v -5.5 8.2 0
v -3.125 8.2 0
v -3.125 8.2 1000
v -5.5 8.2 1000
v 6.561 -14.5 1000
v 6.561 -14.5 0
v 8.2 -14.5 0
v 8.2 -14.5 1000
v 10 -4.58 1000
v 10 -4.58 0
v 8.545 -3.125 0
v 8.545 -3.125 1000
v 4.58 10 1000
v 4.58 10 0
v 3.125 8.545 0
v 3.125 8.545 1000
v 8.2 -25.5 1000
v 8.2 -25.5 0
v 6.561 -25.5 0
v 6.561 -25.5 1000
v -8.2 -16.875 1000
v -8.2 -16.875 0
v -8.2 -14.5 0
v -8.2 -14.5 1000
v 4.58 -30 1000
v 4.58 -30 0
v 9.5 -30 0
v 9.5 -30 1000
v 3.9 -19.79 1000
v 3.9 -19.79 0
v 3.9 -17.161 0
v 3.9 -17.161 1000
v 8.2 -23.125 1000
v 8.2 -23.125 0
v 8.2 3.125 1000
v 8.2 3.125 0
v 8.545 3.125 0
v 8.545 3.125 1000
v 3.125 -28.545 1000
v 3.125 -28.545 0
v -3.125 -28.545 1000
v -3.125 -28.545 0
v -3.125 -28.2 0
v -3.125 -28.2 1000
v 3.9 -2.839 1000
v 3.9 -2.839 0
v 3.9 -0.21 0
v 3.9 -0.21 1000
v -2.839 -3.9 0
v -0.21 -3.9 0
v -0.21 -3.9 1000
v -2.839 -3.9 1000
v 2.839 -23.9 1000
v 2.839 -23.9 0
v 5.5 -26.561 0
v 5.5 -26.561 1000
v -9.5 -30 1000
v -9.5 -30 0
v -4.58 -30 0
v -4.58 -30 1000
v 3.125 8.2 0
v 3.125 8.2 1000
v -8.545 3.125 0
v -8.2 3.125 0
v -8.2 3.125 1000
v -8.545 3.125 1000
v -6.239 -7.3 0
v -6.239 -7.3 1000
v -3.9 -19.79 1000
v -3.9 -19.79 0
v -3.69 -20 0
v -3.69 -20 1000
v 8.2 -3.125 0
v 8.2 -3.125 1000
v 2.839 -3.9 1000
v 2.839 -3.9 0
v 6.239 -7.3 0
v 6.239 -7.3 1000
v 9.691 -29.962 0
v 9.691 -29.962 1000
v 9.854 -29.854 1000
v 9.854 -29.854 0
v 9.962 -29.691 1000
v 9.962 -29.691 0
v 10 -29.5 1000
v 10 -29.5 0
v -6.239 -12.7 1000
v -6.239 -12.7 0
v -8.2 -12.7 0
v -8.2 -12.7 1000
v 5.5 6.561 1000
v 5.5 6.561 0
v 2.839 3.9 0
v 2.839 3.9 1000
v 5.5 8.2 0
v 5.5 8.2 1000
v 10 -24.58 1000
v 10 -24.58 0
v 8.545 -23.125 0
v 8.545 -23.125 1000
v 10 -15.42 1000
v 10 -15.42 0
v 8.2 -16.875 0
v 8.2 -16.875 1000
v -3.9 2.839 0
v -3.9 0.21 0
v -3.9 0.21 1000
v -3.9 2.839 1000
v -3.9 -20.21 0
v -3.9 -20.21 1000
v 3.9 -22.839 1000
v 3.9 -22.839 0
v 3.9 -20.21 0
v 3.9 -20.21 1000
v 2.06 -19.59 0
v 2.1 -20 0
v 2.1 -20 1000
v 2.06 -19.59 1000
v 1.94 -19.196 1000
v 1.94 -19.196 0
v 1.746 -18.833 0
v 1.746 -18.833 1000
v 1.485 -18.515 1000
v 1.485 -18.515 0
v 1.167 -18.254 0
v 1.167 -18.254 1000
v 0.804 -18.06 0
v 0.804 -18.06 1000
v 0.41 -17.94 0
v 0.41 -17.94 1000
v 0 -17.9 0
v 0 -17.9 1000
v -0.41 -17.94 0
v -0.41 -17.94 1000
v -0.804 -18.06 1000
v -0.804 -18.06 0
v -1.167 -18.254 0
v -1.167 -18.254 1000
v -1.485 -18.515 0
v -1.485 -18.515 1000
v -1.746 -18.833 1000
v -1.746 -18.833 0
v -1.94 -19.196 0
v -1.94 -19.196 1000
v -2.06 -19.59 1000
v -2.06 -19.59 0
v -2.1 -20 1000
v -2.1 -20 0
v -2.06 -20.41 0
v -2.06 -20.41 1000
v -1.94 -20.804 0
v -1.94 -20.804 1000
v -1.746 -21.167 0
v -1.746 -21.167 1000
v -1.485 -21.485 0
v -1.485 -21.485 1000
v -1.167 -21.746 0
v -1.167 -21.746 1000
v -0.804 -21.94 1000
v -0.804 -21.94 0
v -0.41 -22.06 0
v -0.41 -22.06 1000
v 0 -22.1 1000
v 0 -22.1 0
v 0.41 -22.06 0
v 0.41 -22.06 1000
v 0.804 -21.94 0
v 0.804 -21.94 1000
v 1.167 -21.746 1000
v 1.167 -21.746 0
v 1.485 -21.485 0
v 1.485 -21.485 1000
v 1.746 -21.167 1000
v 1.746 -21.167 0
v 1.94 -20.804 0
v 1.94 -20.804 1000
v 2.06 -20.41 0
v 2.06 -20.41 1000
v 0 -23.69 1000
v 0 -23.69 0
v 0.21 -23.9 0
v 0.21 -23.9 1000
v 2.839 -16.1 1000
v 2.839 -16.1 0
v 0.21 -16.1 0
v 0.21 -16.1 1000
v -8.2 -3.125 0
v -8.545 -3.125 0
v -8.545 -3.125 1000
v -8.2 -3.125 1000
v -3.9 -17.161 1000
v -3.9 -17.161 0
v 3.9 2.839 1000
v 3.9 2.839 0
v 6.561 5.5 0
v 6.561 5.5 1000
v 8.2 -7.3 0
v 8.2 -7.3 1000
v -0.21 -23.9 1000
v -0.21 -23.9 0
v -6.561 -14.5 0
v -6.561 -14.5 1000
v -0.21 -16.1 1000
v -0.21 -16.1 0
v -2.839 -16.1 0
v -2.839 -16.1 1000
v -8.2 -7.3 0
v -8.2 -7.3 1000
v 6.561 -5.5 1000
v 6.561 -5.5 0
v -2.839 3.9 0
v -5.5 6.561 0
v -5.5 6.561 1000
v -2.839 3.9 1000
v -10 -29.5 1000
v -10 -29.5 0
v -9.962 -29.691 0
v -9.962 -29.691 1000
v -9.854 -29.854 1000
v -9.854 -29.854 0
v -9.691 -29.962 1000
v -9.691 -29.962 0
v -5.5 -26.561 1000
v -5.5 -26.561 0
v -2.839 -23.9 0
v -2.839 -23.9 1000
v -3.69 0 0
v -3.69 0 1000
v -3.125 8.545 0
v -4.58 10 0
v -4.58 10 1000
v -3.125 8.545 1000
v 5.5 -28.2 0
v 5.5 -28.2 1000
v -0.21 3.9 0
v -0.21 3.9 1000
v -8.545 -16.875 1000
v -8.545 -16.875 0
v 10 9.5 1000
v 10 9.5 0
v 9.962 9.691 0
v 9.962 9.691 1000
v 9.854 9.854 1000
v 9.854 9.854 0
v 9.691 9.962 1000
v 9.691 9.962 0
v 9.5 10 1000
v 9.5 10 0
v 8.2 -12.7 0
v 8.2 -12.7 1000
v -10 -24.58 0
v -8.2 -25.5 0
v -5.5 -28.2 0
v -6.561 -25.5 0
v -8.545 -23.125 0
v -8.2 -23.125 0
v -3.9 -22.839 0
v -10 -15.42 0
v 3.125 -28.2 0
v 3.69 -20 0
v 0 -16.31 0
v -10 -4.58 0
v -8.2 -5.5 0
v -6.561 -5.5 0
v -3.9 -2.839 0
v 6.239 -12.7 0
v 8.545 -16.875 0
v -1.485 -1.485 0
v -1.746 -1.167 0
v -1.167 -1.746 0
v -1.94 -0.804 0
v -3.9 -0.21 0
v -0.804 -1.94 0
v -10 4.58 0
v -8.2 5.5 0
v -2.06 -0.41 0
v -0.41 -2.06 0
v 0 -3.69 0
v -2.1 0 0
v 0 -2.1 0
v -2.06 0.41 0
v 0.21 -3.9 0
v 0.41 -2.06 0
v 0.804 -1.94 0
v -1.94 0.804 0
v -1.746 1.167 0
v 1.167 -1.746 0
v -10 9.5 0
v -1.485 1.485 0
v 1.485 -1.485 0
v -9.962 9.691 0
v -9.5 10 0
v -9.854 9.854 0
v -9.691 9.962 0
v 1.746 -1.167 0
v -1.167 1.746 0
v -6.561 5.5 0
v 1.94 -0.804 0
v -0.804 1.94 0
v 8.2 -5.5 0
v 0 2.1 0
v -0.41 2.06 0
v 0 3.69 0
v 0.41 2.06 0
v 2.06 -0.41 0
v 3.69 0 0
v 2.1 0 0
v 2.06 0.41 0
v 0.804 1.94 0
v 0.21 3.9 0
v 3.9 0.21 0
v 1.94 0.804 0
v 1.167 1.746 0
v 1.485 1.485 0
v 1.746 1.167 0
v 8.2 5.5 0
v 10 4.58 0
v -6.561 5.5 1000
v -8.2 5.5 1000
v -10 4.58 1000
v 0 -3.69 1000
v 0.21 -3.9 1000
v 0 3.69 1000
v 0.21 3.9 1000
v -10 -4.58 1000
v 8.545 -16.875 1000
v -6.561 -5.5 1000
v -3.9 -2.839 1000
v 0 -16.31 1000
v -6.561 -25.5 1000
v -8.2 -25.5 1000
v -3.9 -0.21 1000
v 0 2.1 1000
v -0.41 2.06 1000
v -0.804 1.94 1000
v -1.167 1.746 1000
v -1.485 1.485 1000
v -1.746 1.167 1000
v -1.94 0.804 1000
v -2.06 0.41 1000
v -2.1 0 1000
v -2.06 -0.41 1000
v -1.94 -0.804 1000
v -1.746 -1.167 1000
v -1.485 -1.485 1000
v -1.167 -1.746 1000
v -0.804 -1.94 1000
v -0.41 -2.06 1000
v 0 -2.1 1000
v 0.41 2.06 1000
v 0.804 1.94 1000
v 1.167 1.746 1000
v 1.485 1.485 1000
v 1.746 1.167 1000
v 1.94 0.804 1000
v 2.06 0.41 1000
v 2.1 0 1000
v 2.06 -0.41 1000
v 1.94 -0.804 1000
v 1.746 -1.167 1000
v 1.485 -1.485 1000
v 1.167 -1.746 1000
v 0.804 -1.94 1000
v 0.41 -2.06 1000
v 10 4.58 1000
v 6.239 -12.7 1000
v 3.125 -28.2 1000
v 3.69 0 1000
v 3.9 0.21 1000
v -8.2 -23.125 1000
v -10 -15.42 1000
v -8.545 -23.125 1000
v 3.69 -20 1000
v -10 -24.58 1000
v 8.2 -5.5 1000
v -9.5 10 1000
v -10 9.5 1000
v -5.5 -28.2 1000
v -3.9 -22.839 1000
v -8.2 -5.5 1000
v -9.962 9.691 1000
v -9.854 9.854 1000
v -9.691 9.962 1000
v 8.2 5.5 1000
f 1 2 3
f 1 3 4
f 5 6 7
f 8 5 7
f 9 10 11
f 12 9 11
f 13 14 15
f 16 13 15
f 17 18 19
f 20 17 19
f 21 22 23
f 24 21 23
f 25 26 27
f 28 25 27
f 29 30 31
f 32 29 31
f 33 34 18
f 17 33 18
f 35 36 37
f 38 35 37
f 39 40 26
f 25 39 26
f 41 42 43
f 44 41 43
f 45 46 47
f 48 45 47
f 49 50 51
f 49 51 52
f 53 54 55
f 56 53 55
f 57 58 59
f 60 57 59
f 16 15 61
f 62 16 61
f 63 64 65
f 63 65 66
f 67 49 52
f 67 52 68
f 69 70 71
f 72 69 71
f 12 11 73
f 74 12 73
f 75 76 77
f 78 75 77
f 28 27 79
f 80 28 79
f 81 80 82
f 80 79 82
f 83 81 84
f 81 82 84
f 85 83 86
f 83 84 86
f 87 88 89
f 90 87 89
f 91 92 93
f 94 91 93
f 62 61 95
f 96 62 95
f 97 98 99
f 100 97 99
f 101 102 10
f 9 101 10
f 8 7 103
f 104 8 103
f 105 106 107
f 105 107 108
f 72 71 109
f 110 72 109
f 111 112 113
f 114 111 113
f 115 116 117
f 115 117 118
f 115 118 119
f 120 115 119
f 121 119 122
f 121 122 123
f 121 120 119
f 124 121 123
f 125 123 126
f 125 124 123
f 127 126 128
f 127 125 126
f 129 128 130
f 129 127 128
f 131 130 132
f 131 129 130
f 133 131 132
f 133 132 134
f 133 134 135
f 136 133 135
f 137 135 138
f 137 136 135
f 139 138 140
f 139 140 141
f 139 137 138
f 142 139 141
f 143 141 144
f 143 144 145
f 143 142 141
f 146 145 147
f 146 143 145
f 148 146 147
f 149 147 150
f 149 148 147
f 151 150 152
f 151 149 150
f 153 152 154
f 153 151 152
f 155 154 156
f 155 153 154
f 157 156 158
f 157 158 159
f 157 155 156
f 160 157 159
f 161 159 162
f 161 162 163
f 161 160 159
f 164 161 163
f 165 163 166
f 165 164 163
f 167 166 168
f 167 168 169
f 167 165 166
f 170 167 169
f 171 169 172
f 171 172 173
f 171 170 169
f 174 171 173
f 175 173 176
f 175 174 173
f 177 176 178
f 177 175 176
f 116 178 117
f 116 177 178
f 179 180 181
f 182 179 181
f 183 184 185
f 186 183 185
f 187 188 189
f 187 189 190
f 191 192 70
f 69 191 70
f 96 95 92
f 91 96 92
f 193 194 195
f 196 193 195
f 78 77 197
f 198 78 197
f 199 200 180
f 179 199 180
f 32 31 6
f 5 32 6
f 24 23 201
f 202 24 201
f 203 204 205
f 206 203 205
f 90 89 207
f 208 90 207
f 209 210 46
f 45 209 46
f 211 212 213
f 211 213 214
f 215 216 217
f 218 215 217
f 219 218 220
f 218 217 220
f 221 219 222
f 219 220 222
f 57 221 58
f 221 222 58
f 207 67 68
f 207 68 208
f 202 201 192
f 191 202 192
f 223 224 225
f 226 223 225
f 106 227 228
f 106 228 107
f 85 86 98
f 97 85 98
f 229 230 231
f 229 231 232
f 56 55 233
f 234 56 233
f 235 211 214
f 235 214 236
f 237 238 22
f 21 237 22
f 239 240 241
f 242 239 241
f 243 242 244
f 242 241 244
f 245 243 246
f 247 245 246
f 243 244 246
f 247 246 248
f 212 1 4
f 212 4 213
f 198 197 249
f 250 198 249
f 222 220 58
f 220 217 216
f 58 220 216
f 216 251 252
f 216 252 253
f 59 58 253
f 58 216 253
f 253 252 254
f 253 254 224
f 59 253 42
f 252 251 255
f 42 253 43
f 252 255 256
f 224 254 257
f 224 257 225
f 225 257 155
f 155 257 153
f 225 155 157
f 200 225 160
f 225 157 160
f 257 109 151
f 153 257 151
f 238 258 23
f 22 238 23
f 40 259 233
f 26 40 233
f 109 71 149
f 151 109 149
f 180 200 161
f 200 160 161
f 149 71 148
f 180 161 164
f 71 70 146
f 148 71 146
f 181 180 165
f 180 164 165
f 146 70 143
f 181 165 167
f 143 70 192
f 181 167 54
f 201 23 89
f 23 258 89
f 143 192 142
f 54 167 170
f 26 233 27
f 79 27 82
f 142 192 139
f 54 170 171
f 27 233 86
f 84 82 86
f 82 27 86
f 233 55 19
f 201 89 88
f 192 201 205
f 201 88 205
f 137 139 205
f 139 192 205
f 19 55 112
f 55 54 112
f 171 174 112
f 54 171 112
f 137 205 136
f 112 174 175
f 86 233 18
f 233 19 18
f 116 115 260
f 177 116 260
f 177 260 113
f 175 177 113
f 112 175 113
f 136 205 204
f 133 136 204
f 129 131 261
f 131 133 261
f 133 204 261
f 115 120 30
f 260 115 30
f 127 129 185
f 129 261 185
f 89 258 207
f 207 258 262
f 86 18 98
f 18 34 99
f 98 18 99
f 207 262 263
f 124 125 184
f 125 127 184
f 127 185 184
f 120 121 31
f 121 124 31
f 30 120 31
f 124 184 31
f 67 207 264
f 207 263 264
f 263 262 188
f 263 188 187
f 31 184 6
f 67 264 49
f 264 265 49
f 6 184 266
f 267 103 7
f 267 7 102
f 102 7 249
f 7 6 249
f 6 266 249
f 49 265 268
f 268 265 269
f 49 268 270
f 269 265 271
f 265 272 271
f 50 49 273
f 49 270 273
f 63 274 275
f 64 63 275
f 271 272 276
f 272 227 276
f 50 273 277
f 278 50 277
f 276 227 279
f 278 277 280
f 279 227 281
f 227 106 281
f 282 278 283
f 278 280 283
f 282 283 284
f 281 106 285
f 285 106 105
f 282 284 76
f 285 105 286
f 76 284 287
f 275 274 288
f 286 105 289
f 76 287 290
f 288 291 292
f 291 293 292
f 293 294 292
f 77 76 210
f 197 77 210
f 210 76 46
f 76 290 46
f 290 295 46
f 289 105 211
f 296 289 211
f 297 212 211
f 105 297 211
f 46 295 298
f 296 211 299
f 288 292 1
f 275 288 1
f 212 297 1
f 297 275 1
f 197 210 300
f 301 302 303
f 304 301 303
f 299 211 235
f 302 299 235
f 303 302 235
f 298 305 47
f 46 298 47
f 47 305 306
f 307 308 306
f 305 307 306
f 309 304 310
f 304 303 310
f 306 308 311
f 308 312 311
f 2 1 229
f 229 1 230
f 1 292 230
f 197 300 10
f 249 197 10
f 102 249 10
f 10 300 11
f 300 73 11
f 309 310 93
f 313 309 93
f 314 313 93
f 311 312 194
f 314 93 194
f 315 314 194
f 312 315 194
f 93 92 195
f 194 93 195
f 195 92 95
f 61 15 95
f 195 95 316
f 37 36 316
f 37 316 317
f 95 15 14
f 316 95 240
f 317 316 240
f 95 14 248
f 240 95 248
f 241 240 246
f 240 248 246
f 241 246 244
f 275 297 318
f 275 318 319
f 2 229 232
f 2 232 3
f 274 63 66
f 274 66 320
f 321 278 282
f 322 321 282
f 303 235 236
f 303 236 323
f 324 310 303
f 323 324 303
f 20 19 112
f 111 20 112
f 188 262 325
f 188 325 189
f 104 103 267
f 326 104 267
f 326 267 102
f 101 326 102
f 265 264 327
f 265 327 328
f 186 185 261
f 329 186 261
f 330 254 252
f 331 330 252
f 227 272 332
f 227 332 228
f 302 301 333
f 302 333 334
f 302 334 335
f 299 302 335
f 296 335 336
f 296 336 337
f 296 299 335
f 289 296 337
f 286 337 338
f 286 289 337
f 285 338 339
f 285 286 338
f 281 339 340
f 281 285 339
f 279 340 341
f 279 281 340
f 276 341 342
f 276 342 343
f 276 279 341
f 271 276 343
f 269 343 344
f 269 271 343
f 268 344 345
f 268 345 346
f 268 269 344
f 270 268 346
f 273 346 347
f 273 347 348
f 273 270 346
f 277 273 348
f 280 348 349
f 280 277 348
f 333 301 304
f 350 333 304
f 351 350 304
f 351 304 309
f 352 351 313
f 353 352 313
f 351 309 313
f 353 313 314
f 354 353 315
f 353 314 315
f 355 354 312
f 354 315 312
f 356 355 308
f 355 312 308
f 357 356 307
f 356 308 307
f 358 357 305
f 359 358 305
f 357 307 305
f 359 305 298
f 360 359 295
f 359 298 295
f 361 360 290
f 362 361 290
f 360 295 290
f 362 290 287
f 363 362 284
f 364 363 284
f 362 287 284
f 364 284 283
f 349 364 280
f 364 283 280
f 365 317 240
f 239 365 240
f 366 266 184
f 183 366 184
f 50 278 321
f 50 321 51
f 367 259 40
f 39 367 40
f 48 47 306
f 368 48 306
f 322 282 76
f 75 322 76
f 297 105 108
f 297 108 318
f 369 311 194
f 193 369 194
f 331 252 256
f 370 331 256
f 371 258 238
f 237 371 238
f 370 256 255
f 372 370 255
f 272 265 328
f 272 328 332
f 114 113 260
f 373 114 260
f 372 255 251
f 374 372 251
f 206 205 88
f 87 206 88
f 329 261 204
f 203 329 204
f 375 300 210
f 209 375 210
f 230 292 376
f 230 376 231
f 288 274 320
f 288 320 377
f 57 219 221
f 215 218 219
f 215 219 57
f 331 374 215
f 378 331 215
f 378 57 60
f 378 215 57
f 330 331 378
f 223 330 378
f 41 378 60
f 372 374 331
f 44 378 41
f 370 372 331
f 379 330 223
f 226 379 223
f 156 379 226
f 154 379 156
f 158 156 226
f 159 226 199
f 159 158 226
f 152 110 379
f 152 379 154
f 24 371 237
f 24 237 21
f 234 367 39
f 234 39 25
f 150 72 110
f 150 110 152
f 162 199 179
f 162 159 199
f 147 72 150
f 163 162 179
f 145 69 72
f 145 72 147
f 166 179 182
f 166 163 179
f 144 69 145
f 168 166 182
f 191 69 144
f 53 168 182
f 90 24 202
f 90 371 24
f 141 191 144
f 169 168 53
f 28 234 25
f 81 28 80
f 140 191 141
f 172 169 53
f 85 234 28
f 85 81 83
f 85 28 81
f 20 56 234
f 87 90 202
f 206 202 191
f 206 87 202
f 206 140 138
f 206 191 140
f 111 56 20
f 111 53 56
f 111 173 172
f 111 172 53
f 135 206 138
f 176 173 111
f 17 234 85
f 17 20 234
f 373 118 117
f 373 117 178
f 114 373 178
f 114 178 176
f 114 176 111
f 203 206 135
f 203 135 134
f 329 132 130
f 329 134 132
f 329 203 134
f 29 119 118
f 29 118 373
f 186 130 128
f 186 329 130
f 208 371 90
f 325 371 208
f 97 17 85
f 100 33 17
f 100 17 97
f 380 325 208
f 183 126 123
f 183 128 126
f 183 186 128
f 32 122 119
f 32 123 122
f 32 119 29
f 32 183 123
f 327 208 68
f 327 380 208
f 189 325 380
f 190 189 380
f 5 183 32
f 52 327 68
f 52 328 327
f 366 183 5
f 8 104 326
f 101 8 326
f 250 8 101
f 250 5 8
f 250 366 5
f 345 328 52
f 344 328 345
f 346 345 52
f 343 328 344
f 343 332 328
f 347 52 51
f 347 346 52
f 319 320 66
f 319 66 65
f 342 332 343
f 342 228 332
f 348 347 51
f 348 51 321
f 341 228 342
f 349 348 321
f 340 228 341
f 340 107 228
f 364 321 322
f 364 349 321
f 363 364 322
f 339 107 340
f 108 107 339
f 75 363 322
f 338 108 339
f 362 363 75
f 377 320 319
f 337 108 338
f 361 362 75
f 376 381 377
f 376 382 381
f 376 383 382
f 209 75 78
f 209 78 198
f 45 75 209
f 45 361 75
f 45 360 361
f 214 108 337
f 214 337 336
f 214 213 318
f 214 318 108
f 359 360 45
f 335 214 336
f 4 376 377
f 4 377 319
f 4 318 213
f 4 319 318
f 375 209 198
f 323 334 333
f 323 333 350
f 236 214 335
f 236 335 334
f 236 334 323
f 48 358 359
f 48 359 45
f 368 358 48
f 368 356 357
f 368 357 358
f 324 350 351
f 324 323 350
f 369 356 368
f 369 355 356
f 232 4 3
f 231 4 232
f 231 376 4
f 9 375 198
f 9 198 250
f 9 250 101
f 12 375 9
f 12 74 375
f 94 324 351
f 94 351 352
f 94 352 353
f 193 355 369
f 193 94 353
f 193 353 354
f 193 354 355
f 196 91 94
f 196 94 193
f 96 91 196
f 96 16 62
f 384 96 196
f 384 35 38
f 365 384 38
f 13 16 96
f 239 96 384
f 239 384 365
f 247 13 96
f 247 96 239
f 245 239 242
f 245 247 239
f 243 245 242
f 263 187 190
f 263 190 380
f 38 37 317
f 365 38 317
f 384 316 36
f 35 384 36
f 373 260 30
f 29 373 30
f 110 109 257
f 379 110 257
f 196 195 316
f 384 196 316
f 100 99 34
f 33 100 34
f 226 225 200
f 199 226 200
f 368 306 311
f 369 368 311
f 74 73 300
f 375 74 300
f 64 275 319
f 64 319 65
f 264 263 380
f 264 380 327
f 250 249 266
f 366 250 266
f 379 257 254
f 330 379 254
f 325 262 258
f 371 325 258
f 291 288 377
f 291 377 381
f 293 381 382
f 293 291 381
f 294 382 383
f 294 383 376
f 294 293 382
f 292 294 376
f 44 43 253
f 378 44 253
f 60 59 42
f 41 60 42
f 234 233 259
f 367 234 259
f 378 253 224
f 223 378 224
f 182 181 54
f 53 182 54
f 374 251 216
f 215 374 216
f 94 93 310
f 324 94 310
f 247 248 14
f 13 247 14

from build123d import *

# Parameters (mm, degrees)
BOSS_EXTRU_1_DEPTH  = 1000
SYM_TRIE6_OUTLINE_R = 2.1
SYM_TRIE6_DEPTH     = 1000


# Read off the part's stored shape, not the designer's step: Symétrie6
with BuildPart() as part:
    # Esquisse1 → Boss.-Extru.1 (new body)
    with BuildSketch(Plane.XY):
        with BuildLine():
            Line((-9.5, 10), (-4.58, 10))
            Line((-4.58, 10), (-3.125, 8.545))
            Line((-3.125, 8.545), (-3.125, 8.2))
            Line((-3.125, 8.2), (-5.5, 8.2))
            Line((-5.5, 8.2), (-5.5, 6.560660172))
            Line((-5.5, 6.560660172), (-2.839339828, 3.9))
            Line((-2.839339828, 3.9), (-0.21, 3.9))
            Line((-0.21, 3.9), (0, 3.69))
            Line((0, 3.69), (0, 2.1))
            ThreePointArc((0, 2.1), (-2.1, 0), (0, -2.1))
            Line((0, -2.1), (0, -3.69))
            Line((0, -3.69), (-0.21, -3.9))
            Line((-0.21, -3.9), (-2.839339828, -3.9))
            Line((-2.839339828, -3.9), (-6.239339828, -7.3))
            Line((-6.239339828, -7.3), (-8.2, -7.3))
            Line((-8.2, -7.3), (-8.2, -10))
            Line((-8.2, -10), (-10, -10))
            Line((-10, -10), (-10, -4.58))
            Line((-10, -4.58), (-8.545, -3.125))
            Line((-8.545, -3.125), (-8.2, -3.125))
            Line((-8.2, -3.125), (-8.2, -5.5))
            Line((-8.2, -5.5), (-6.560660172, -5.5))
            Line((-6.560660172, -5.5), (-3.9, -2.839339828))
            Line((-3.9, -2.839339828), (-3.9, -0.21))
            Line((-3.9, -0.21), (-3.69, 0))
            Line((-3.69, 0), (-3.9, 0.21))
            Line((-3.9, 0.21), (-3.9, 2.839339828))
            Line((-3.9, 2.839339828), (-6.560660172, 5.5))
            Line((-6.560660172, 5.5), (-8.2, 5.5))
            Line((-8.2, 5.5), (-8.2, 3.125))
            Line((-8.2, 3.125), (-8.545, 3.125))
            Line((-8.545, 3.125), (-10, 4.58))
            Line((-10, 4.58), (-10, 9.5))
            ThreePointArc((-10, 9.5), (-9.853553391, 9.853553391), (-9.5, 10))
        make_face()
    boss_extru_1 = extrude(amount=BOSS_EXTRU_1_DEPTH)

    # Symétrie1: Boss.-Extru.1 across Right Plane
    add(boss_extru_1.mirror(Plane(origin=(0, 0, 0), x_dir=(0, 0, -1), z_dir=(1, 0, 0))))

    # Symétrie6 outline → Symétrie6 (add)
    with BuildSketch(Plane.XY):
        with BuildLine():
            Line((-3.9, -17.160660172), (-3.9, -19.79))
            Line((-3.9, -19.79), (-3.69, -20))
            Line((-3.69, -20), (-3.9, -20.21))
            Line((-3.9, -20.21), (-3.9, -22.839339828))
            Line((-3.9, -22.839339828), (-6.560660172, -25.5))
            Line((-6.560660172, -25.5), (-8.2, -25.5))
            Line((-8.2, -25.5), (-8.2, -23.125))
            Line((-8.2, -23.125), (-8.545, -23.125))
            Line((-8.545, -23.125), (-10, -24.58))
            Line((-10, -24.58), (-10, -29.5))
            ThreePointArc((-10, -29.5), (-9.853553391, -29.853553391), (-9.5, -30))
            Line((-9.5, -30), (-4.58, -30))
            Line((-4.58, -30), (-3.125, -28.545))
            Line((-3.125, -28.545), (-3.125, -28.2))
            Line((-3.125, -28.2), (-5.5, -28.2))
            Line((-5.5, -28.2), (-5.5, -26.560660172))
            Line((-5.5, -26.560660172), (-2.839339828, -23.9))
            Line((-2.839339828, -23.9), (-0.21, -23.9))
            Line((-0.21, -23.9), (0, -23.69))
            Line((0, -23.69), (0.21, -23.9))
            Line((0.21, -23.9), (2.839339828, -23.9))
            Line((2.839339828, -23.9), (5.5, -26.560660172))
            Line((5.5, -26.560660172), (5.5, -28.2))
            Line((5.5, -28.2), (3.125, -28.2))
            Line((3.125, -28.2), (3.125, -28.545))
            Line((3.125, -28.545), (4.58, -30))
            Line((4.58, -30), (9.5, -30))
            ThreePointArc((9.5, -30), (9.853553391, -29.853553391), (10, -29.5))
            Line((10, -29.5), (10, -24.58))
            Line((10, -24.58), (8.545, -23.125))
            Line((8.545, -23.125), (8.2, -23.125))
            Line((8.2, -23.125), (8.2, -25.5))
            Line((8.2, -25.5), (6.560660172, -25.5))
            Line((6.560660172, -25.5), (3.9, -22.839339828))
            Line((3.9, -22.839339828), (3.9, -20.21))
            Line((3.9, -20.21), (3.69, -20))
            Line((3.69, -20), (3.9, -19.79))
            Line((3.9, -19.79), (3.9, -17.160660172))
            Line((3.9, -17.160660172), (6.560660172, -14.5))
            Line((6.560660172, -14.5), (8.2, -14.5))
            Line((8.2, -14.5), (8.2, -16.875))
            Line((8.2, -16.875), (8.545, -16.875))
            Line((8.545, -16.875), (10, -15.42))
            Line((10, -15.42), (10, -10))
            Line((10, -10), (8.2, -10))
            Line((8.2, -10), (8.2, -12.7))
            Line((8.2, -12.7), (6.239339828, -12.7))
            Line((6.239339828, -12.7), (2.839339828, -16.1))
            Line((2.839339828, -16.1), (0.21, -16.1))
            Line((0.21, -16.1), (0, -16.31))
            Line((0, -16.31), (-0.21, -16.1))
            Line((-0.21, -16.1), (-2.839339828, -16.1))
            Line((-2.839339828, -16.1), (-6.239339828, -12.7))
            Line((-6.239339828, -12.7), (-8.2, -12.7))
            Line((-8.2, -12.7), (-8.2, -10))
            Line((-8.2, -10), (-10, -10))
            Line((-10, -10), (-10, -15.42))
            Line((-10, -15.42), (-8.545, -16.875))
            Line((-8.545, -16.875), (-8.2, -16.875))
            Line((-8.2, -16.875), (-8.2, -14.5))
            Line((-8.2, -14.5), (-6.560660172, -14.5))
            Line((-6.560660172, -14.5), (-3.9, -17.160660172))
        make_face()
        with Locations((0, -20)):
            Circle(SYM_TRIE6_OUTLINE_R, mode=Mode.SUBTRACT)
    extrude(amount=SYM_TRIE6_DEPTH)


solid = part.part
